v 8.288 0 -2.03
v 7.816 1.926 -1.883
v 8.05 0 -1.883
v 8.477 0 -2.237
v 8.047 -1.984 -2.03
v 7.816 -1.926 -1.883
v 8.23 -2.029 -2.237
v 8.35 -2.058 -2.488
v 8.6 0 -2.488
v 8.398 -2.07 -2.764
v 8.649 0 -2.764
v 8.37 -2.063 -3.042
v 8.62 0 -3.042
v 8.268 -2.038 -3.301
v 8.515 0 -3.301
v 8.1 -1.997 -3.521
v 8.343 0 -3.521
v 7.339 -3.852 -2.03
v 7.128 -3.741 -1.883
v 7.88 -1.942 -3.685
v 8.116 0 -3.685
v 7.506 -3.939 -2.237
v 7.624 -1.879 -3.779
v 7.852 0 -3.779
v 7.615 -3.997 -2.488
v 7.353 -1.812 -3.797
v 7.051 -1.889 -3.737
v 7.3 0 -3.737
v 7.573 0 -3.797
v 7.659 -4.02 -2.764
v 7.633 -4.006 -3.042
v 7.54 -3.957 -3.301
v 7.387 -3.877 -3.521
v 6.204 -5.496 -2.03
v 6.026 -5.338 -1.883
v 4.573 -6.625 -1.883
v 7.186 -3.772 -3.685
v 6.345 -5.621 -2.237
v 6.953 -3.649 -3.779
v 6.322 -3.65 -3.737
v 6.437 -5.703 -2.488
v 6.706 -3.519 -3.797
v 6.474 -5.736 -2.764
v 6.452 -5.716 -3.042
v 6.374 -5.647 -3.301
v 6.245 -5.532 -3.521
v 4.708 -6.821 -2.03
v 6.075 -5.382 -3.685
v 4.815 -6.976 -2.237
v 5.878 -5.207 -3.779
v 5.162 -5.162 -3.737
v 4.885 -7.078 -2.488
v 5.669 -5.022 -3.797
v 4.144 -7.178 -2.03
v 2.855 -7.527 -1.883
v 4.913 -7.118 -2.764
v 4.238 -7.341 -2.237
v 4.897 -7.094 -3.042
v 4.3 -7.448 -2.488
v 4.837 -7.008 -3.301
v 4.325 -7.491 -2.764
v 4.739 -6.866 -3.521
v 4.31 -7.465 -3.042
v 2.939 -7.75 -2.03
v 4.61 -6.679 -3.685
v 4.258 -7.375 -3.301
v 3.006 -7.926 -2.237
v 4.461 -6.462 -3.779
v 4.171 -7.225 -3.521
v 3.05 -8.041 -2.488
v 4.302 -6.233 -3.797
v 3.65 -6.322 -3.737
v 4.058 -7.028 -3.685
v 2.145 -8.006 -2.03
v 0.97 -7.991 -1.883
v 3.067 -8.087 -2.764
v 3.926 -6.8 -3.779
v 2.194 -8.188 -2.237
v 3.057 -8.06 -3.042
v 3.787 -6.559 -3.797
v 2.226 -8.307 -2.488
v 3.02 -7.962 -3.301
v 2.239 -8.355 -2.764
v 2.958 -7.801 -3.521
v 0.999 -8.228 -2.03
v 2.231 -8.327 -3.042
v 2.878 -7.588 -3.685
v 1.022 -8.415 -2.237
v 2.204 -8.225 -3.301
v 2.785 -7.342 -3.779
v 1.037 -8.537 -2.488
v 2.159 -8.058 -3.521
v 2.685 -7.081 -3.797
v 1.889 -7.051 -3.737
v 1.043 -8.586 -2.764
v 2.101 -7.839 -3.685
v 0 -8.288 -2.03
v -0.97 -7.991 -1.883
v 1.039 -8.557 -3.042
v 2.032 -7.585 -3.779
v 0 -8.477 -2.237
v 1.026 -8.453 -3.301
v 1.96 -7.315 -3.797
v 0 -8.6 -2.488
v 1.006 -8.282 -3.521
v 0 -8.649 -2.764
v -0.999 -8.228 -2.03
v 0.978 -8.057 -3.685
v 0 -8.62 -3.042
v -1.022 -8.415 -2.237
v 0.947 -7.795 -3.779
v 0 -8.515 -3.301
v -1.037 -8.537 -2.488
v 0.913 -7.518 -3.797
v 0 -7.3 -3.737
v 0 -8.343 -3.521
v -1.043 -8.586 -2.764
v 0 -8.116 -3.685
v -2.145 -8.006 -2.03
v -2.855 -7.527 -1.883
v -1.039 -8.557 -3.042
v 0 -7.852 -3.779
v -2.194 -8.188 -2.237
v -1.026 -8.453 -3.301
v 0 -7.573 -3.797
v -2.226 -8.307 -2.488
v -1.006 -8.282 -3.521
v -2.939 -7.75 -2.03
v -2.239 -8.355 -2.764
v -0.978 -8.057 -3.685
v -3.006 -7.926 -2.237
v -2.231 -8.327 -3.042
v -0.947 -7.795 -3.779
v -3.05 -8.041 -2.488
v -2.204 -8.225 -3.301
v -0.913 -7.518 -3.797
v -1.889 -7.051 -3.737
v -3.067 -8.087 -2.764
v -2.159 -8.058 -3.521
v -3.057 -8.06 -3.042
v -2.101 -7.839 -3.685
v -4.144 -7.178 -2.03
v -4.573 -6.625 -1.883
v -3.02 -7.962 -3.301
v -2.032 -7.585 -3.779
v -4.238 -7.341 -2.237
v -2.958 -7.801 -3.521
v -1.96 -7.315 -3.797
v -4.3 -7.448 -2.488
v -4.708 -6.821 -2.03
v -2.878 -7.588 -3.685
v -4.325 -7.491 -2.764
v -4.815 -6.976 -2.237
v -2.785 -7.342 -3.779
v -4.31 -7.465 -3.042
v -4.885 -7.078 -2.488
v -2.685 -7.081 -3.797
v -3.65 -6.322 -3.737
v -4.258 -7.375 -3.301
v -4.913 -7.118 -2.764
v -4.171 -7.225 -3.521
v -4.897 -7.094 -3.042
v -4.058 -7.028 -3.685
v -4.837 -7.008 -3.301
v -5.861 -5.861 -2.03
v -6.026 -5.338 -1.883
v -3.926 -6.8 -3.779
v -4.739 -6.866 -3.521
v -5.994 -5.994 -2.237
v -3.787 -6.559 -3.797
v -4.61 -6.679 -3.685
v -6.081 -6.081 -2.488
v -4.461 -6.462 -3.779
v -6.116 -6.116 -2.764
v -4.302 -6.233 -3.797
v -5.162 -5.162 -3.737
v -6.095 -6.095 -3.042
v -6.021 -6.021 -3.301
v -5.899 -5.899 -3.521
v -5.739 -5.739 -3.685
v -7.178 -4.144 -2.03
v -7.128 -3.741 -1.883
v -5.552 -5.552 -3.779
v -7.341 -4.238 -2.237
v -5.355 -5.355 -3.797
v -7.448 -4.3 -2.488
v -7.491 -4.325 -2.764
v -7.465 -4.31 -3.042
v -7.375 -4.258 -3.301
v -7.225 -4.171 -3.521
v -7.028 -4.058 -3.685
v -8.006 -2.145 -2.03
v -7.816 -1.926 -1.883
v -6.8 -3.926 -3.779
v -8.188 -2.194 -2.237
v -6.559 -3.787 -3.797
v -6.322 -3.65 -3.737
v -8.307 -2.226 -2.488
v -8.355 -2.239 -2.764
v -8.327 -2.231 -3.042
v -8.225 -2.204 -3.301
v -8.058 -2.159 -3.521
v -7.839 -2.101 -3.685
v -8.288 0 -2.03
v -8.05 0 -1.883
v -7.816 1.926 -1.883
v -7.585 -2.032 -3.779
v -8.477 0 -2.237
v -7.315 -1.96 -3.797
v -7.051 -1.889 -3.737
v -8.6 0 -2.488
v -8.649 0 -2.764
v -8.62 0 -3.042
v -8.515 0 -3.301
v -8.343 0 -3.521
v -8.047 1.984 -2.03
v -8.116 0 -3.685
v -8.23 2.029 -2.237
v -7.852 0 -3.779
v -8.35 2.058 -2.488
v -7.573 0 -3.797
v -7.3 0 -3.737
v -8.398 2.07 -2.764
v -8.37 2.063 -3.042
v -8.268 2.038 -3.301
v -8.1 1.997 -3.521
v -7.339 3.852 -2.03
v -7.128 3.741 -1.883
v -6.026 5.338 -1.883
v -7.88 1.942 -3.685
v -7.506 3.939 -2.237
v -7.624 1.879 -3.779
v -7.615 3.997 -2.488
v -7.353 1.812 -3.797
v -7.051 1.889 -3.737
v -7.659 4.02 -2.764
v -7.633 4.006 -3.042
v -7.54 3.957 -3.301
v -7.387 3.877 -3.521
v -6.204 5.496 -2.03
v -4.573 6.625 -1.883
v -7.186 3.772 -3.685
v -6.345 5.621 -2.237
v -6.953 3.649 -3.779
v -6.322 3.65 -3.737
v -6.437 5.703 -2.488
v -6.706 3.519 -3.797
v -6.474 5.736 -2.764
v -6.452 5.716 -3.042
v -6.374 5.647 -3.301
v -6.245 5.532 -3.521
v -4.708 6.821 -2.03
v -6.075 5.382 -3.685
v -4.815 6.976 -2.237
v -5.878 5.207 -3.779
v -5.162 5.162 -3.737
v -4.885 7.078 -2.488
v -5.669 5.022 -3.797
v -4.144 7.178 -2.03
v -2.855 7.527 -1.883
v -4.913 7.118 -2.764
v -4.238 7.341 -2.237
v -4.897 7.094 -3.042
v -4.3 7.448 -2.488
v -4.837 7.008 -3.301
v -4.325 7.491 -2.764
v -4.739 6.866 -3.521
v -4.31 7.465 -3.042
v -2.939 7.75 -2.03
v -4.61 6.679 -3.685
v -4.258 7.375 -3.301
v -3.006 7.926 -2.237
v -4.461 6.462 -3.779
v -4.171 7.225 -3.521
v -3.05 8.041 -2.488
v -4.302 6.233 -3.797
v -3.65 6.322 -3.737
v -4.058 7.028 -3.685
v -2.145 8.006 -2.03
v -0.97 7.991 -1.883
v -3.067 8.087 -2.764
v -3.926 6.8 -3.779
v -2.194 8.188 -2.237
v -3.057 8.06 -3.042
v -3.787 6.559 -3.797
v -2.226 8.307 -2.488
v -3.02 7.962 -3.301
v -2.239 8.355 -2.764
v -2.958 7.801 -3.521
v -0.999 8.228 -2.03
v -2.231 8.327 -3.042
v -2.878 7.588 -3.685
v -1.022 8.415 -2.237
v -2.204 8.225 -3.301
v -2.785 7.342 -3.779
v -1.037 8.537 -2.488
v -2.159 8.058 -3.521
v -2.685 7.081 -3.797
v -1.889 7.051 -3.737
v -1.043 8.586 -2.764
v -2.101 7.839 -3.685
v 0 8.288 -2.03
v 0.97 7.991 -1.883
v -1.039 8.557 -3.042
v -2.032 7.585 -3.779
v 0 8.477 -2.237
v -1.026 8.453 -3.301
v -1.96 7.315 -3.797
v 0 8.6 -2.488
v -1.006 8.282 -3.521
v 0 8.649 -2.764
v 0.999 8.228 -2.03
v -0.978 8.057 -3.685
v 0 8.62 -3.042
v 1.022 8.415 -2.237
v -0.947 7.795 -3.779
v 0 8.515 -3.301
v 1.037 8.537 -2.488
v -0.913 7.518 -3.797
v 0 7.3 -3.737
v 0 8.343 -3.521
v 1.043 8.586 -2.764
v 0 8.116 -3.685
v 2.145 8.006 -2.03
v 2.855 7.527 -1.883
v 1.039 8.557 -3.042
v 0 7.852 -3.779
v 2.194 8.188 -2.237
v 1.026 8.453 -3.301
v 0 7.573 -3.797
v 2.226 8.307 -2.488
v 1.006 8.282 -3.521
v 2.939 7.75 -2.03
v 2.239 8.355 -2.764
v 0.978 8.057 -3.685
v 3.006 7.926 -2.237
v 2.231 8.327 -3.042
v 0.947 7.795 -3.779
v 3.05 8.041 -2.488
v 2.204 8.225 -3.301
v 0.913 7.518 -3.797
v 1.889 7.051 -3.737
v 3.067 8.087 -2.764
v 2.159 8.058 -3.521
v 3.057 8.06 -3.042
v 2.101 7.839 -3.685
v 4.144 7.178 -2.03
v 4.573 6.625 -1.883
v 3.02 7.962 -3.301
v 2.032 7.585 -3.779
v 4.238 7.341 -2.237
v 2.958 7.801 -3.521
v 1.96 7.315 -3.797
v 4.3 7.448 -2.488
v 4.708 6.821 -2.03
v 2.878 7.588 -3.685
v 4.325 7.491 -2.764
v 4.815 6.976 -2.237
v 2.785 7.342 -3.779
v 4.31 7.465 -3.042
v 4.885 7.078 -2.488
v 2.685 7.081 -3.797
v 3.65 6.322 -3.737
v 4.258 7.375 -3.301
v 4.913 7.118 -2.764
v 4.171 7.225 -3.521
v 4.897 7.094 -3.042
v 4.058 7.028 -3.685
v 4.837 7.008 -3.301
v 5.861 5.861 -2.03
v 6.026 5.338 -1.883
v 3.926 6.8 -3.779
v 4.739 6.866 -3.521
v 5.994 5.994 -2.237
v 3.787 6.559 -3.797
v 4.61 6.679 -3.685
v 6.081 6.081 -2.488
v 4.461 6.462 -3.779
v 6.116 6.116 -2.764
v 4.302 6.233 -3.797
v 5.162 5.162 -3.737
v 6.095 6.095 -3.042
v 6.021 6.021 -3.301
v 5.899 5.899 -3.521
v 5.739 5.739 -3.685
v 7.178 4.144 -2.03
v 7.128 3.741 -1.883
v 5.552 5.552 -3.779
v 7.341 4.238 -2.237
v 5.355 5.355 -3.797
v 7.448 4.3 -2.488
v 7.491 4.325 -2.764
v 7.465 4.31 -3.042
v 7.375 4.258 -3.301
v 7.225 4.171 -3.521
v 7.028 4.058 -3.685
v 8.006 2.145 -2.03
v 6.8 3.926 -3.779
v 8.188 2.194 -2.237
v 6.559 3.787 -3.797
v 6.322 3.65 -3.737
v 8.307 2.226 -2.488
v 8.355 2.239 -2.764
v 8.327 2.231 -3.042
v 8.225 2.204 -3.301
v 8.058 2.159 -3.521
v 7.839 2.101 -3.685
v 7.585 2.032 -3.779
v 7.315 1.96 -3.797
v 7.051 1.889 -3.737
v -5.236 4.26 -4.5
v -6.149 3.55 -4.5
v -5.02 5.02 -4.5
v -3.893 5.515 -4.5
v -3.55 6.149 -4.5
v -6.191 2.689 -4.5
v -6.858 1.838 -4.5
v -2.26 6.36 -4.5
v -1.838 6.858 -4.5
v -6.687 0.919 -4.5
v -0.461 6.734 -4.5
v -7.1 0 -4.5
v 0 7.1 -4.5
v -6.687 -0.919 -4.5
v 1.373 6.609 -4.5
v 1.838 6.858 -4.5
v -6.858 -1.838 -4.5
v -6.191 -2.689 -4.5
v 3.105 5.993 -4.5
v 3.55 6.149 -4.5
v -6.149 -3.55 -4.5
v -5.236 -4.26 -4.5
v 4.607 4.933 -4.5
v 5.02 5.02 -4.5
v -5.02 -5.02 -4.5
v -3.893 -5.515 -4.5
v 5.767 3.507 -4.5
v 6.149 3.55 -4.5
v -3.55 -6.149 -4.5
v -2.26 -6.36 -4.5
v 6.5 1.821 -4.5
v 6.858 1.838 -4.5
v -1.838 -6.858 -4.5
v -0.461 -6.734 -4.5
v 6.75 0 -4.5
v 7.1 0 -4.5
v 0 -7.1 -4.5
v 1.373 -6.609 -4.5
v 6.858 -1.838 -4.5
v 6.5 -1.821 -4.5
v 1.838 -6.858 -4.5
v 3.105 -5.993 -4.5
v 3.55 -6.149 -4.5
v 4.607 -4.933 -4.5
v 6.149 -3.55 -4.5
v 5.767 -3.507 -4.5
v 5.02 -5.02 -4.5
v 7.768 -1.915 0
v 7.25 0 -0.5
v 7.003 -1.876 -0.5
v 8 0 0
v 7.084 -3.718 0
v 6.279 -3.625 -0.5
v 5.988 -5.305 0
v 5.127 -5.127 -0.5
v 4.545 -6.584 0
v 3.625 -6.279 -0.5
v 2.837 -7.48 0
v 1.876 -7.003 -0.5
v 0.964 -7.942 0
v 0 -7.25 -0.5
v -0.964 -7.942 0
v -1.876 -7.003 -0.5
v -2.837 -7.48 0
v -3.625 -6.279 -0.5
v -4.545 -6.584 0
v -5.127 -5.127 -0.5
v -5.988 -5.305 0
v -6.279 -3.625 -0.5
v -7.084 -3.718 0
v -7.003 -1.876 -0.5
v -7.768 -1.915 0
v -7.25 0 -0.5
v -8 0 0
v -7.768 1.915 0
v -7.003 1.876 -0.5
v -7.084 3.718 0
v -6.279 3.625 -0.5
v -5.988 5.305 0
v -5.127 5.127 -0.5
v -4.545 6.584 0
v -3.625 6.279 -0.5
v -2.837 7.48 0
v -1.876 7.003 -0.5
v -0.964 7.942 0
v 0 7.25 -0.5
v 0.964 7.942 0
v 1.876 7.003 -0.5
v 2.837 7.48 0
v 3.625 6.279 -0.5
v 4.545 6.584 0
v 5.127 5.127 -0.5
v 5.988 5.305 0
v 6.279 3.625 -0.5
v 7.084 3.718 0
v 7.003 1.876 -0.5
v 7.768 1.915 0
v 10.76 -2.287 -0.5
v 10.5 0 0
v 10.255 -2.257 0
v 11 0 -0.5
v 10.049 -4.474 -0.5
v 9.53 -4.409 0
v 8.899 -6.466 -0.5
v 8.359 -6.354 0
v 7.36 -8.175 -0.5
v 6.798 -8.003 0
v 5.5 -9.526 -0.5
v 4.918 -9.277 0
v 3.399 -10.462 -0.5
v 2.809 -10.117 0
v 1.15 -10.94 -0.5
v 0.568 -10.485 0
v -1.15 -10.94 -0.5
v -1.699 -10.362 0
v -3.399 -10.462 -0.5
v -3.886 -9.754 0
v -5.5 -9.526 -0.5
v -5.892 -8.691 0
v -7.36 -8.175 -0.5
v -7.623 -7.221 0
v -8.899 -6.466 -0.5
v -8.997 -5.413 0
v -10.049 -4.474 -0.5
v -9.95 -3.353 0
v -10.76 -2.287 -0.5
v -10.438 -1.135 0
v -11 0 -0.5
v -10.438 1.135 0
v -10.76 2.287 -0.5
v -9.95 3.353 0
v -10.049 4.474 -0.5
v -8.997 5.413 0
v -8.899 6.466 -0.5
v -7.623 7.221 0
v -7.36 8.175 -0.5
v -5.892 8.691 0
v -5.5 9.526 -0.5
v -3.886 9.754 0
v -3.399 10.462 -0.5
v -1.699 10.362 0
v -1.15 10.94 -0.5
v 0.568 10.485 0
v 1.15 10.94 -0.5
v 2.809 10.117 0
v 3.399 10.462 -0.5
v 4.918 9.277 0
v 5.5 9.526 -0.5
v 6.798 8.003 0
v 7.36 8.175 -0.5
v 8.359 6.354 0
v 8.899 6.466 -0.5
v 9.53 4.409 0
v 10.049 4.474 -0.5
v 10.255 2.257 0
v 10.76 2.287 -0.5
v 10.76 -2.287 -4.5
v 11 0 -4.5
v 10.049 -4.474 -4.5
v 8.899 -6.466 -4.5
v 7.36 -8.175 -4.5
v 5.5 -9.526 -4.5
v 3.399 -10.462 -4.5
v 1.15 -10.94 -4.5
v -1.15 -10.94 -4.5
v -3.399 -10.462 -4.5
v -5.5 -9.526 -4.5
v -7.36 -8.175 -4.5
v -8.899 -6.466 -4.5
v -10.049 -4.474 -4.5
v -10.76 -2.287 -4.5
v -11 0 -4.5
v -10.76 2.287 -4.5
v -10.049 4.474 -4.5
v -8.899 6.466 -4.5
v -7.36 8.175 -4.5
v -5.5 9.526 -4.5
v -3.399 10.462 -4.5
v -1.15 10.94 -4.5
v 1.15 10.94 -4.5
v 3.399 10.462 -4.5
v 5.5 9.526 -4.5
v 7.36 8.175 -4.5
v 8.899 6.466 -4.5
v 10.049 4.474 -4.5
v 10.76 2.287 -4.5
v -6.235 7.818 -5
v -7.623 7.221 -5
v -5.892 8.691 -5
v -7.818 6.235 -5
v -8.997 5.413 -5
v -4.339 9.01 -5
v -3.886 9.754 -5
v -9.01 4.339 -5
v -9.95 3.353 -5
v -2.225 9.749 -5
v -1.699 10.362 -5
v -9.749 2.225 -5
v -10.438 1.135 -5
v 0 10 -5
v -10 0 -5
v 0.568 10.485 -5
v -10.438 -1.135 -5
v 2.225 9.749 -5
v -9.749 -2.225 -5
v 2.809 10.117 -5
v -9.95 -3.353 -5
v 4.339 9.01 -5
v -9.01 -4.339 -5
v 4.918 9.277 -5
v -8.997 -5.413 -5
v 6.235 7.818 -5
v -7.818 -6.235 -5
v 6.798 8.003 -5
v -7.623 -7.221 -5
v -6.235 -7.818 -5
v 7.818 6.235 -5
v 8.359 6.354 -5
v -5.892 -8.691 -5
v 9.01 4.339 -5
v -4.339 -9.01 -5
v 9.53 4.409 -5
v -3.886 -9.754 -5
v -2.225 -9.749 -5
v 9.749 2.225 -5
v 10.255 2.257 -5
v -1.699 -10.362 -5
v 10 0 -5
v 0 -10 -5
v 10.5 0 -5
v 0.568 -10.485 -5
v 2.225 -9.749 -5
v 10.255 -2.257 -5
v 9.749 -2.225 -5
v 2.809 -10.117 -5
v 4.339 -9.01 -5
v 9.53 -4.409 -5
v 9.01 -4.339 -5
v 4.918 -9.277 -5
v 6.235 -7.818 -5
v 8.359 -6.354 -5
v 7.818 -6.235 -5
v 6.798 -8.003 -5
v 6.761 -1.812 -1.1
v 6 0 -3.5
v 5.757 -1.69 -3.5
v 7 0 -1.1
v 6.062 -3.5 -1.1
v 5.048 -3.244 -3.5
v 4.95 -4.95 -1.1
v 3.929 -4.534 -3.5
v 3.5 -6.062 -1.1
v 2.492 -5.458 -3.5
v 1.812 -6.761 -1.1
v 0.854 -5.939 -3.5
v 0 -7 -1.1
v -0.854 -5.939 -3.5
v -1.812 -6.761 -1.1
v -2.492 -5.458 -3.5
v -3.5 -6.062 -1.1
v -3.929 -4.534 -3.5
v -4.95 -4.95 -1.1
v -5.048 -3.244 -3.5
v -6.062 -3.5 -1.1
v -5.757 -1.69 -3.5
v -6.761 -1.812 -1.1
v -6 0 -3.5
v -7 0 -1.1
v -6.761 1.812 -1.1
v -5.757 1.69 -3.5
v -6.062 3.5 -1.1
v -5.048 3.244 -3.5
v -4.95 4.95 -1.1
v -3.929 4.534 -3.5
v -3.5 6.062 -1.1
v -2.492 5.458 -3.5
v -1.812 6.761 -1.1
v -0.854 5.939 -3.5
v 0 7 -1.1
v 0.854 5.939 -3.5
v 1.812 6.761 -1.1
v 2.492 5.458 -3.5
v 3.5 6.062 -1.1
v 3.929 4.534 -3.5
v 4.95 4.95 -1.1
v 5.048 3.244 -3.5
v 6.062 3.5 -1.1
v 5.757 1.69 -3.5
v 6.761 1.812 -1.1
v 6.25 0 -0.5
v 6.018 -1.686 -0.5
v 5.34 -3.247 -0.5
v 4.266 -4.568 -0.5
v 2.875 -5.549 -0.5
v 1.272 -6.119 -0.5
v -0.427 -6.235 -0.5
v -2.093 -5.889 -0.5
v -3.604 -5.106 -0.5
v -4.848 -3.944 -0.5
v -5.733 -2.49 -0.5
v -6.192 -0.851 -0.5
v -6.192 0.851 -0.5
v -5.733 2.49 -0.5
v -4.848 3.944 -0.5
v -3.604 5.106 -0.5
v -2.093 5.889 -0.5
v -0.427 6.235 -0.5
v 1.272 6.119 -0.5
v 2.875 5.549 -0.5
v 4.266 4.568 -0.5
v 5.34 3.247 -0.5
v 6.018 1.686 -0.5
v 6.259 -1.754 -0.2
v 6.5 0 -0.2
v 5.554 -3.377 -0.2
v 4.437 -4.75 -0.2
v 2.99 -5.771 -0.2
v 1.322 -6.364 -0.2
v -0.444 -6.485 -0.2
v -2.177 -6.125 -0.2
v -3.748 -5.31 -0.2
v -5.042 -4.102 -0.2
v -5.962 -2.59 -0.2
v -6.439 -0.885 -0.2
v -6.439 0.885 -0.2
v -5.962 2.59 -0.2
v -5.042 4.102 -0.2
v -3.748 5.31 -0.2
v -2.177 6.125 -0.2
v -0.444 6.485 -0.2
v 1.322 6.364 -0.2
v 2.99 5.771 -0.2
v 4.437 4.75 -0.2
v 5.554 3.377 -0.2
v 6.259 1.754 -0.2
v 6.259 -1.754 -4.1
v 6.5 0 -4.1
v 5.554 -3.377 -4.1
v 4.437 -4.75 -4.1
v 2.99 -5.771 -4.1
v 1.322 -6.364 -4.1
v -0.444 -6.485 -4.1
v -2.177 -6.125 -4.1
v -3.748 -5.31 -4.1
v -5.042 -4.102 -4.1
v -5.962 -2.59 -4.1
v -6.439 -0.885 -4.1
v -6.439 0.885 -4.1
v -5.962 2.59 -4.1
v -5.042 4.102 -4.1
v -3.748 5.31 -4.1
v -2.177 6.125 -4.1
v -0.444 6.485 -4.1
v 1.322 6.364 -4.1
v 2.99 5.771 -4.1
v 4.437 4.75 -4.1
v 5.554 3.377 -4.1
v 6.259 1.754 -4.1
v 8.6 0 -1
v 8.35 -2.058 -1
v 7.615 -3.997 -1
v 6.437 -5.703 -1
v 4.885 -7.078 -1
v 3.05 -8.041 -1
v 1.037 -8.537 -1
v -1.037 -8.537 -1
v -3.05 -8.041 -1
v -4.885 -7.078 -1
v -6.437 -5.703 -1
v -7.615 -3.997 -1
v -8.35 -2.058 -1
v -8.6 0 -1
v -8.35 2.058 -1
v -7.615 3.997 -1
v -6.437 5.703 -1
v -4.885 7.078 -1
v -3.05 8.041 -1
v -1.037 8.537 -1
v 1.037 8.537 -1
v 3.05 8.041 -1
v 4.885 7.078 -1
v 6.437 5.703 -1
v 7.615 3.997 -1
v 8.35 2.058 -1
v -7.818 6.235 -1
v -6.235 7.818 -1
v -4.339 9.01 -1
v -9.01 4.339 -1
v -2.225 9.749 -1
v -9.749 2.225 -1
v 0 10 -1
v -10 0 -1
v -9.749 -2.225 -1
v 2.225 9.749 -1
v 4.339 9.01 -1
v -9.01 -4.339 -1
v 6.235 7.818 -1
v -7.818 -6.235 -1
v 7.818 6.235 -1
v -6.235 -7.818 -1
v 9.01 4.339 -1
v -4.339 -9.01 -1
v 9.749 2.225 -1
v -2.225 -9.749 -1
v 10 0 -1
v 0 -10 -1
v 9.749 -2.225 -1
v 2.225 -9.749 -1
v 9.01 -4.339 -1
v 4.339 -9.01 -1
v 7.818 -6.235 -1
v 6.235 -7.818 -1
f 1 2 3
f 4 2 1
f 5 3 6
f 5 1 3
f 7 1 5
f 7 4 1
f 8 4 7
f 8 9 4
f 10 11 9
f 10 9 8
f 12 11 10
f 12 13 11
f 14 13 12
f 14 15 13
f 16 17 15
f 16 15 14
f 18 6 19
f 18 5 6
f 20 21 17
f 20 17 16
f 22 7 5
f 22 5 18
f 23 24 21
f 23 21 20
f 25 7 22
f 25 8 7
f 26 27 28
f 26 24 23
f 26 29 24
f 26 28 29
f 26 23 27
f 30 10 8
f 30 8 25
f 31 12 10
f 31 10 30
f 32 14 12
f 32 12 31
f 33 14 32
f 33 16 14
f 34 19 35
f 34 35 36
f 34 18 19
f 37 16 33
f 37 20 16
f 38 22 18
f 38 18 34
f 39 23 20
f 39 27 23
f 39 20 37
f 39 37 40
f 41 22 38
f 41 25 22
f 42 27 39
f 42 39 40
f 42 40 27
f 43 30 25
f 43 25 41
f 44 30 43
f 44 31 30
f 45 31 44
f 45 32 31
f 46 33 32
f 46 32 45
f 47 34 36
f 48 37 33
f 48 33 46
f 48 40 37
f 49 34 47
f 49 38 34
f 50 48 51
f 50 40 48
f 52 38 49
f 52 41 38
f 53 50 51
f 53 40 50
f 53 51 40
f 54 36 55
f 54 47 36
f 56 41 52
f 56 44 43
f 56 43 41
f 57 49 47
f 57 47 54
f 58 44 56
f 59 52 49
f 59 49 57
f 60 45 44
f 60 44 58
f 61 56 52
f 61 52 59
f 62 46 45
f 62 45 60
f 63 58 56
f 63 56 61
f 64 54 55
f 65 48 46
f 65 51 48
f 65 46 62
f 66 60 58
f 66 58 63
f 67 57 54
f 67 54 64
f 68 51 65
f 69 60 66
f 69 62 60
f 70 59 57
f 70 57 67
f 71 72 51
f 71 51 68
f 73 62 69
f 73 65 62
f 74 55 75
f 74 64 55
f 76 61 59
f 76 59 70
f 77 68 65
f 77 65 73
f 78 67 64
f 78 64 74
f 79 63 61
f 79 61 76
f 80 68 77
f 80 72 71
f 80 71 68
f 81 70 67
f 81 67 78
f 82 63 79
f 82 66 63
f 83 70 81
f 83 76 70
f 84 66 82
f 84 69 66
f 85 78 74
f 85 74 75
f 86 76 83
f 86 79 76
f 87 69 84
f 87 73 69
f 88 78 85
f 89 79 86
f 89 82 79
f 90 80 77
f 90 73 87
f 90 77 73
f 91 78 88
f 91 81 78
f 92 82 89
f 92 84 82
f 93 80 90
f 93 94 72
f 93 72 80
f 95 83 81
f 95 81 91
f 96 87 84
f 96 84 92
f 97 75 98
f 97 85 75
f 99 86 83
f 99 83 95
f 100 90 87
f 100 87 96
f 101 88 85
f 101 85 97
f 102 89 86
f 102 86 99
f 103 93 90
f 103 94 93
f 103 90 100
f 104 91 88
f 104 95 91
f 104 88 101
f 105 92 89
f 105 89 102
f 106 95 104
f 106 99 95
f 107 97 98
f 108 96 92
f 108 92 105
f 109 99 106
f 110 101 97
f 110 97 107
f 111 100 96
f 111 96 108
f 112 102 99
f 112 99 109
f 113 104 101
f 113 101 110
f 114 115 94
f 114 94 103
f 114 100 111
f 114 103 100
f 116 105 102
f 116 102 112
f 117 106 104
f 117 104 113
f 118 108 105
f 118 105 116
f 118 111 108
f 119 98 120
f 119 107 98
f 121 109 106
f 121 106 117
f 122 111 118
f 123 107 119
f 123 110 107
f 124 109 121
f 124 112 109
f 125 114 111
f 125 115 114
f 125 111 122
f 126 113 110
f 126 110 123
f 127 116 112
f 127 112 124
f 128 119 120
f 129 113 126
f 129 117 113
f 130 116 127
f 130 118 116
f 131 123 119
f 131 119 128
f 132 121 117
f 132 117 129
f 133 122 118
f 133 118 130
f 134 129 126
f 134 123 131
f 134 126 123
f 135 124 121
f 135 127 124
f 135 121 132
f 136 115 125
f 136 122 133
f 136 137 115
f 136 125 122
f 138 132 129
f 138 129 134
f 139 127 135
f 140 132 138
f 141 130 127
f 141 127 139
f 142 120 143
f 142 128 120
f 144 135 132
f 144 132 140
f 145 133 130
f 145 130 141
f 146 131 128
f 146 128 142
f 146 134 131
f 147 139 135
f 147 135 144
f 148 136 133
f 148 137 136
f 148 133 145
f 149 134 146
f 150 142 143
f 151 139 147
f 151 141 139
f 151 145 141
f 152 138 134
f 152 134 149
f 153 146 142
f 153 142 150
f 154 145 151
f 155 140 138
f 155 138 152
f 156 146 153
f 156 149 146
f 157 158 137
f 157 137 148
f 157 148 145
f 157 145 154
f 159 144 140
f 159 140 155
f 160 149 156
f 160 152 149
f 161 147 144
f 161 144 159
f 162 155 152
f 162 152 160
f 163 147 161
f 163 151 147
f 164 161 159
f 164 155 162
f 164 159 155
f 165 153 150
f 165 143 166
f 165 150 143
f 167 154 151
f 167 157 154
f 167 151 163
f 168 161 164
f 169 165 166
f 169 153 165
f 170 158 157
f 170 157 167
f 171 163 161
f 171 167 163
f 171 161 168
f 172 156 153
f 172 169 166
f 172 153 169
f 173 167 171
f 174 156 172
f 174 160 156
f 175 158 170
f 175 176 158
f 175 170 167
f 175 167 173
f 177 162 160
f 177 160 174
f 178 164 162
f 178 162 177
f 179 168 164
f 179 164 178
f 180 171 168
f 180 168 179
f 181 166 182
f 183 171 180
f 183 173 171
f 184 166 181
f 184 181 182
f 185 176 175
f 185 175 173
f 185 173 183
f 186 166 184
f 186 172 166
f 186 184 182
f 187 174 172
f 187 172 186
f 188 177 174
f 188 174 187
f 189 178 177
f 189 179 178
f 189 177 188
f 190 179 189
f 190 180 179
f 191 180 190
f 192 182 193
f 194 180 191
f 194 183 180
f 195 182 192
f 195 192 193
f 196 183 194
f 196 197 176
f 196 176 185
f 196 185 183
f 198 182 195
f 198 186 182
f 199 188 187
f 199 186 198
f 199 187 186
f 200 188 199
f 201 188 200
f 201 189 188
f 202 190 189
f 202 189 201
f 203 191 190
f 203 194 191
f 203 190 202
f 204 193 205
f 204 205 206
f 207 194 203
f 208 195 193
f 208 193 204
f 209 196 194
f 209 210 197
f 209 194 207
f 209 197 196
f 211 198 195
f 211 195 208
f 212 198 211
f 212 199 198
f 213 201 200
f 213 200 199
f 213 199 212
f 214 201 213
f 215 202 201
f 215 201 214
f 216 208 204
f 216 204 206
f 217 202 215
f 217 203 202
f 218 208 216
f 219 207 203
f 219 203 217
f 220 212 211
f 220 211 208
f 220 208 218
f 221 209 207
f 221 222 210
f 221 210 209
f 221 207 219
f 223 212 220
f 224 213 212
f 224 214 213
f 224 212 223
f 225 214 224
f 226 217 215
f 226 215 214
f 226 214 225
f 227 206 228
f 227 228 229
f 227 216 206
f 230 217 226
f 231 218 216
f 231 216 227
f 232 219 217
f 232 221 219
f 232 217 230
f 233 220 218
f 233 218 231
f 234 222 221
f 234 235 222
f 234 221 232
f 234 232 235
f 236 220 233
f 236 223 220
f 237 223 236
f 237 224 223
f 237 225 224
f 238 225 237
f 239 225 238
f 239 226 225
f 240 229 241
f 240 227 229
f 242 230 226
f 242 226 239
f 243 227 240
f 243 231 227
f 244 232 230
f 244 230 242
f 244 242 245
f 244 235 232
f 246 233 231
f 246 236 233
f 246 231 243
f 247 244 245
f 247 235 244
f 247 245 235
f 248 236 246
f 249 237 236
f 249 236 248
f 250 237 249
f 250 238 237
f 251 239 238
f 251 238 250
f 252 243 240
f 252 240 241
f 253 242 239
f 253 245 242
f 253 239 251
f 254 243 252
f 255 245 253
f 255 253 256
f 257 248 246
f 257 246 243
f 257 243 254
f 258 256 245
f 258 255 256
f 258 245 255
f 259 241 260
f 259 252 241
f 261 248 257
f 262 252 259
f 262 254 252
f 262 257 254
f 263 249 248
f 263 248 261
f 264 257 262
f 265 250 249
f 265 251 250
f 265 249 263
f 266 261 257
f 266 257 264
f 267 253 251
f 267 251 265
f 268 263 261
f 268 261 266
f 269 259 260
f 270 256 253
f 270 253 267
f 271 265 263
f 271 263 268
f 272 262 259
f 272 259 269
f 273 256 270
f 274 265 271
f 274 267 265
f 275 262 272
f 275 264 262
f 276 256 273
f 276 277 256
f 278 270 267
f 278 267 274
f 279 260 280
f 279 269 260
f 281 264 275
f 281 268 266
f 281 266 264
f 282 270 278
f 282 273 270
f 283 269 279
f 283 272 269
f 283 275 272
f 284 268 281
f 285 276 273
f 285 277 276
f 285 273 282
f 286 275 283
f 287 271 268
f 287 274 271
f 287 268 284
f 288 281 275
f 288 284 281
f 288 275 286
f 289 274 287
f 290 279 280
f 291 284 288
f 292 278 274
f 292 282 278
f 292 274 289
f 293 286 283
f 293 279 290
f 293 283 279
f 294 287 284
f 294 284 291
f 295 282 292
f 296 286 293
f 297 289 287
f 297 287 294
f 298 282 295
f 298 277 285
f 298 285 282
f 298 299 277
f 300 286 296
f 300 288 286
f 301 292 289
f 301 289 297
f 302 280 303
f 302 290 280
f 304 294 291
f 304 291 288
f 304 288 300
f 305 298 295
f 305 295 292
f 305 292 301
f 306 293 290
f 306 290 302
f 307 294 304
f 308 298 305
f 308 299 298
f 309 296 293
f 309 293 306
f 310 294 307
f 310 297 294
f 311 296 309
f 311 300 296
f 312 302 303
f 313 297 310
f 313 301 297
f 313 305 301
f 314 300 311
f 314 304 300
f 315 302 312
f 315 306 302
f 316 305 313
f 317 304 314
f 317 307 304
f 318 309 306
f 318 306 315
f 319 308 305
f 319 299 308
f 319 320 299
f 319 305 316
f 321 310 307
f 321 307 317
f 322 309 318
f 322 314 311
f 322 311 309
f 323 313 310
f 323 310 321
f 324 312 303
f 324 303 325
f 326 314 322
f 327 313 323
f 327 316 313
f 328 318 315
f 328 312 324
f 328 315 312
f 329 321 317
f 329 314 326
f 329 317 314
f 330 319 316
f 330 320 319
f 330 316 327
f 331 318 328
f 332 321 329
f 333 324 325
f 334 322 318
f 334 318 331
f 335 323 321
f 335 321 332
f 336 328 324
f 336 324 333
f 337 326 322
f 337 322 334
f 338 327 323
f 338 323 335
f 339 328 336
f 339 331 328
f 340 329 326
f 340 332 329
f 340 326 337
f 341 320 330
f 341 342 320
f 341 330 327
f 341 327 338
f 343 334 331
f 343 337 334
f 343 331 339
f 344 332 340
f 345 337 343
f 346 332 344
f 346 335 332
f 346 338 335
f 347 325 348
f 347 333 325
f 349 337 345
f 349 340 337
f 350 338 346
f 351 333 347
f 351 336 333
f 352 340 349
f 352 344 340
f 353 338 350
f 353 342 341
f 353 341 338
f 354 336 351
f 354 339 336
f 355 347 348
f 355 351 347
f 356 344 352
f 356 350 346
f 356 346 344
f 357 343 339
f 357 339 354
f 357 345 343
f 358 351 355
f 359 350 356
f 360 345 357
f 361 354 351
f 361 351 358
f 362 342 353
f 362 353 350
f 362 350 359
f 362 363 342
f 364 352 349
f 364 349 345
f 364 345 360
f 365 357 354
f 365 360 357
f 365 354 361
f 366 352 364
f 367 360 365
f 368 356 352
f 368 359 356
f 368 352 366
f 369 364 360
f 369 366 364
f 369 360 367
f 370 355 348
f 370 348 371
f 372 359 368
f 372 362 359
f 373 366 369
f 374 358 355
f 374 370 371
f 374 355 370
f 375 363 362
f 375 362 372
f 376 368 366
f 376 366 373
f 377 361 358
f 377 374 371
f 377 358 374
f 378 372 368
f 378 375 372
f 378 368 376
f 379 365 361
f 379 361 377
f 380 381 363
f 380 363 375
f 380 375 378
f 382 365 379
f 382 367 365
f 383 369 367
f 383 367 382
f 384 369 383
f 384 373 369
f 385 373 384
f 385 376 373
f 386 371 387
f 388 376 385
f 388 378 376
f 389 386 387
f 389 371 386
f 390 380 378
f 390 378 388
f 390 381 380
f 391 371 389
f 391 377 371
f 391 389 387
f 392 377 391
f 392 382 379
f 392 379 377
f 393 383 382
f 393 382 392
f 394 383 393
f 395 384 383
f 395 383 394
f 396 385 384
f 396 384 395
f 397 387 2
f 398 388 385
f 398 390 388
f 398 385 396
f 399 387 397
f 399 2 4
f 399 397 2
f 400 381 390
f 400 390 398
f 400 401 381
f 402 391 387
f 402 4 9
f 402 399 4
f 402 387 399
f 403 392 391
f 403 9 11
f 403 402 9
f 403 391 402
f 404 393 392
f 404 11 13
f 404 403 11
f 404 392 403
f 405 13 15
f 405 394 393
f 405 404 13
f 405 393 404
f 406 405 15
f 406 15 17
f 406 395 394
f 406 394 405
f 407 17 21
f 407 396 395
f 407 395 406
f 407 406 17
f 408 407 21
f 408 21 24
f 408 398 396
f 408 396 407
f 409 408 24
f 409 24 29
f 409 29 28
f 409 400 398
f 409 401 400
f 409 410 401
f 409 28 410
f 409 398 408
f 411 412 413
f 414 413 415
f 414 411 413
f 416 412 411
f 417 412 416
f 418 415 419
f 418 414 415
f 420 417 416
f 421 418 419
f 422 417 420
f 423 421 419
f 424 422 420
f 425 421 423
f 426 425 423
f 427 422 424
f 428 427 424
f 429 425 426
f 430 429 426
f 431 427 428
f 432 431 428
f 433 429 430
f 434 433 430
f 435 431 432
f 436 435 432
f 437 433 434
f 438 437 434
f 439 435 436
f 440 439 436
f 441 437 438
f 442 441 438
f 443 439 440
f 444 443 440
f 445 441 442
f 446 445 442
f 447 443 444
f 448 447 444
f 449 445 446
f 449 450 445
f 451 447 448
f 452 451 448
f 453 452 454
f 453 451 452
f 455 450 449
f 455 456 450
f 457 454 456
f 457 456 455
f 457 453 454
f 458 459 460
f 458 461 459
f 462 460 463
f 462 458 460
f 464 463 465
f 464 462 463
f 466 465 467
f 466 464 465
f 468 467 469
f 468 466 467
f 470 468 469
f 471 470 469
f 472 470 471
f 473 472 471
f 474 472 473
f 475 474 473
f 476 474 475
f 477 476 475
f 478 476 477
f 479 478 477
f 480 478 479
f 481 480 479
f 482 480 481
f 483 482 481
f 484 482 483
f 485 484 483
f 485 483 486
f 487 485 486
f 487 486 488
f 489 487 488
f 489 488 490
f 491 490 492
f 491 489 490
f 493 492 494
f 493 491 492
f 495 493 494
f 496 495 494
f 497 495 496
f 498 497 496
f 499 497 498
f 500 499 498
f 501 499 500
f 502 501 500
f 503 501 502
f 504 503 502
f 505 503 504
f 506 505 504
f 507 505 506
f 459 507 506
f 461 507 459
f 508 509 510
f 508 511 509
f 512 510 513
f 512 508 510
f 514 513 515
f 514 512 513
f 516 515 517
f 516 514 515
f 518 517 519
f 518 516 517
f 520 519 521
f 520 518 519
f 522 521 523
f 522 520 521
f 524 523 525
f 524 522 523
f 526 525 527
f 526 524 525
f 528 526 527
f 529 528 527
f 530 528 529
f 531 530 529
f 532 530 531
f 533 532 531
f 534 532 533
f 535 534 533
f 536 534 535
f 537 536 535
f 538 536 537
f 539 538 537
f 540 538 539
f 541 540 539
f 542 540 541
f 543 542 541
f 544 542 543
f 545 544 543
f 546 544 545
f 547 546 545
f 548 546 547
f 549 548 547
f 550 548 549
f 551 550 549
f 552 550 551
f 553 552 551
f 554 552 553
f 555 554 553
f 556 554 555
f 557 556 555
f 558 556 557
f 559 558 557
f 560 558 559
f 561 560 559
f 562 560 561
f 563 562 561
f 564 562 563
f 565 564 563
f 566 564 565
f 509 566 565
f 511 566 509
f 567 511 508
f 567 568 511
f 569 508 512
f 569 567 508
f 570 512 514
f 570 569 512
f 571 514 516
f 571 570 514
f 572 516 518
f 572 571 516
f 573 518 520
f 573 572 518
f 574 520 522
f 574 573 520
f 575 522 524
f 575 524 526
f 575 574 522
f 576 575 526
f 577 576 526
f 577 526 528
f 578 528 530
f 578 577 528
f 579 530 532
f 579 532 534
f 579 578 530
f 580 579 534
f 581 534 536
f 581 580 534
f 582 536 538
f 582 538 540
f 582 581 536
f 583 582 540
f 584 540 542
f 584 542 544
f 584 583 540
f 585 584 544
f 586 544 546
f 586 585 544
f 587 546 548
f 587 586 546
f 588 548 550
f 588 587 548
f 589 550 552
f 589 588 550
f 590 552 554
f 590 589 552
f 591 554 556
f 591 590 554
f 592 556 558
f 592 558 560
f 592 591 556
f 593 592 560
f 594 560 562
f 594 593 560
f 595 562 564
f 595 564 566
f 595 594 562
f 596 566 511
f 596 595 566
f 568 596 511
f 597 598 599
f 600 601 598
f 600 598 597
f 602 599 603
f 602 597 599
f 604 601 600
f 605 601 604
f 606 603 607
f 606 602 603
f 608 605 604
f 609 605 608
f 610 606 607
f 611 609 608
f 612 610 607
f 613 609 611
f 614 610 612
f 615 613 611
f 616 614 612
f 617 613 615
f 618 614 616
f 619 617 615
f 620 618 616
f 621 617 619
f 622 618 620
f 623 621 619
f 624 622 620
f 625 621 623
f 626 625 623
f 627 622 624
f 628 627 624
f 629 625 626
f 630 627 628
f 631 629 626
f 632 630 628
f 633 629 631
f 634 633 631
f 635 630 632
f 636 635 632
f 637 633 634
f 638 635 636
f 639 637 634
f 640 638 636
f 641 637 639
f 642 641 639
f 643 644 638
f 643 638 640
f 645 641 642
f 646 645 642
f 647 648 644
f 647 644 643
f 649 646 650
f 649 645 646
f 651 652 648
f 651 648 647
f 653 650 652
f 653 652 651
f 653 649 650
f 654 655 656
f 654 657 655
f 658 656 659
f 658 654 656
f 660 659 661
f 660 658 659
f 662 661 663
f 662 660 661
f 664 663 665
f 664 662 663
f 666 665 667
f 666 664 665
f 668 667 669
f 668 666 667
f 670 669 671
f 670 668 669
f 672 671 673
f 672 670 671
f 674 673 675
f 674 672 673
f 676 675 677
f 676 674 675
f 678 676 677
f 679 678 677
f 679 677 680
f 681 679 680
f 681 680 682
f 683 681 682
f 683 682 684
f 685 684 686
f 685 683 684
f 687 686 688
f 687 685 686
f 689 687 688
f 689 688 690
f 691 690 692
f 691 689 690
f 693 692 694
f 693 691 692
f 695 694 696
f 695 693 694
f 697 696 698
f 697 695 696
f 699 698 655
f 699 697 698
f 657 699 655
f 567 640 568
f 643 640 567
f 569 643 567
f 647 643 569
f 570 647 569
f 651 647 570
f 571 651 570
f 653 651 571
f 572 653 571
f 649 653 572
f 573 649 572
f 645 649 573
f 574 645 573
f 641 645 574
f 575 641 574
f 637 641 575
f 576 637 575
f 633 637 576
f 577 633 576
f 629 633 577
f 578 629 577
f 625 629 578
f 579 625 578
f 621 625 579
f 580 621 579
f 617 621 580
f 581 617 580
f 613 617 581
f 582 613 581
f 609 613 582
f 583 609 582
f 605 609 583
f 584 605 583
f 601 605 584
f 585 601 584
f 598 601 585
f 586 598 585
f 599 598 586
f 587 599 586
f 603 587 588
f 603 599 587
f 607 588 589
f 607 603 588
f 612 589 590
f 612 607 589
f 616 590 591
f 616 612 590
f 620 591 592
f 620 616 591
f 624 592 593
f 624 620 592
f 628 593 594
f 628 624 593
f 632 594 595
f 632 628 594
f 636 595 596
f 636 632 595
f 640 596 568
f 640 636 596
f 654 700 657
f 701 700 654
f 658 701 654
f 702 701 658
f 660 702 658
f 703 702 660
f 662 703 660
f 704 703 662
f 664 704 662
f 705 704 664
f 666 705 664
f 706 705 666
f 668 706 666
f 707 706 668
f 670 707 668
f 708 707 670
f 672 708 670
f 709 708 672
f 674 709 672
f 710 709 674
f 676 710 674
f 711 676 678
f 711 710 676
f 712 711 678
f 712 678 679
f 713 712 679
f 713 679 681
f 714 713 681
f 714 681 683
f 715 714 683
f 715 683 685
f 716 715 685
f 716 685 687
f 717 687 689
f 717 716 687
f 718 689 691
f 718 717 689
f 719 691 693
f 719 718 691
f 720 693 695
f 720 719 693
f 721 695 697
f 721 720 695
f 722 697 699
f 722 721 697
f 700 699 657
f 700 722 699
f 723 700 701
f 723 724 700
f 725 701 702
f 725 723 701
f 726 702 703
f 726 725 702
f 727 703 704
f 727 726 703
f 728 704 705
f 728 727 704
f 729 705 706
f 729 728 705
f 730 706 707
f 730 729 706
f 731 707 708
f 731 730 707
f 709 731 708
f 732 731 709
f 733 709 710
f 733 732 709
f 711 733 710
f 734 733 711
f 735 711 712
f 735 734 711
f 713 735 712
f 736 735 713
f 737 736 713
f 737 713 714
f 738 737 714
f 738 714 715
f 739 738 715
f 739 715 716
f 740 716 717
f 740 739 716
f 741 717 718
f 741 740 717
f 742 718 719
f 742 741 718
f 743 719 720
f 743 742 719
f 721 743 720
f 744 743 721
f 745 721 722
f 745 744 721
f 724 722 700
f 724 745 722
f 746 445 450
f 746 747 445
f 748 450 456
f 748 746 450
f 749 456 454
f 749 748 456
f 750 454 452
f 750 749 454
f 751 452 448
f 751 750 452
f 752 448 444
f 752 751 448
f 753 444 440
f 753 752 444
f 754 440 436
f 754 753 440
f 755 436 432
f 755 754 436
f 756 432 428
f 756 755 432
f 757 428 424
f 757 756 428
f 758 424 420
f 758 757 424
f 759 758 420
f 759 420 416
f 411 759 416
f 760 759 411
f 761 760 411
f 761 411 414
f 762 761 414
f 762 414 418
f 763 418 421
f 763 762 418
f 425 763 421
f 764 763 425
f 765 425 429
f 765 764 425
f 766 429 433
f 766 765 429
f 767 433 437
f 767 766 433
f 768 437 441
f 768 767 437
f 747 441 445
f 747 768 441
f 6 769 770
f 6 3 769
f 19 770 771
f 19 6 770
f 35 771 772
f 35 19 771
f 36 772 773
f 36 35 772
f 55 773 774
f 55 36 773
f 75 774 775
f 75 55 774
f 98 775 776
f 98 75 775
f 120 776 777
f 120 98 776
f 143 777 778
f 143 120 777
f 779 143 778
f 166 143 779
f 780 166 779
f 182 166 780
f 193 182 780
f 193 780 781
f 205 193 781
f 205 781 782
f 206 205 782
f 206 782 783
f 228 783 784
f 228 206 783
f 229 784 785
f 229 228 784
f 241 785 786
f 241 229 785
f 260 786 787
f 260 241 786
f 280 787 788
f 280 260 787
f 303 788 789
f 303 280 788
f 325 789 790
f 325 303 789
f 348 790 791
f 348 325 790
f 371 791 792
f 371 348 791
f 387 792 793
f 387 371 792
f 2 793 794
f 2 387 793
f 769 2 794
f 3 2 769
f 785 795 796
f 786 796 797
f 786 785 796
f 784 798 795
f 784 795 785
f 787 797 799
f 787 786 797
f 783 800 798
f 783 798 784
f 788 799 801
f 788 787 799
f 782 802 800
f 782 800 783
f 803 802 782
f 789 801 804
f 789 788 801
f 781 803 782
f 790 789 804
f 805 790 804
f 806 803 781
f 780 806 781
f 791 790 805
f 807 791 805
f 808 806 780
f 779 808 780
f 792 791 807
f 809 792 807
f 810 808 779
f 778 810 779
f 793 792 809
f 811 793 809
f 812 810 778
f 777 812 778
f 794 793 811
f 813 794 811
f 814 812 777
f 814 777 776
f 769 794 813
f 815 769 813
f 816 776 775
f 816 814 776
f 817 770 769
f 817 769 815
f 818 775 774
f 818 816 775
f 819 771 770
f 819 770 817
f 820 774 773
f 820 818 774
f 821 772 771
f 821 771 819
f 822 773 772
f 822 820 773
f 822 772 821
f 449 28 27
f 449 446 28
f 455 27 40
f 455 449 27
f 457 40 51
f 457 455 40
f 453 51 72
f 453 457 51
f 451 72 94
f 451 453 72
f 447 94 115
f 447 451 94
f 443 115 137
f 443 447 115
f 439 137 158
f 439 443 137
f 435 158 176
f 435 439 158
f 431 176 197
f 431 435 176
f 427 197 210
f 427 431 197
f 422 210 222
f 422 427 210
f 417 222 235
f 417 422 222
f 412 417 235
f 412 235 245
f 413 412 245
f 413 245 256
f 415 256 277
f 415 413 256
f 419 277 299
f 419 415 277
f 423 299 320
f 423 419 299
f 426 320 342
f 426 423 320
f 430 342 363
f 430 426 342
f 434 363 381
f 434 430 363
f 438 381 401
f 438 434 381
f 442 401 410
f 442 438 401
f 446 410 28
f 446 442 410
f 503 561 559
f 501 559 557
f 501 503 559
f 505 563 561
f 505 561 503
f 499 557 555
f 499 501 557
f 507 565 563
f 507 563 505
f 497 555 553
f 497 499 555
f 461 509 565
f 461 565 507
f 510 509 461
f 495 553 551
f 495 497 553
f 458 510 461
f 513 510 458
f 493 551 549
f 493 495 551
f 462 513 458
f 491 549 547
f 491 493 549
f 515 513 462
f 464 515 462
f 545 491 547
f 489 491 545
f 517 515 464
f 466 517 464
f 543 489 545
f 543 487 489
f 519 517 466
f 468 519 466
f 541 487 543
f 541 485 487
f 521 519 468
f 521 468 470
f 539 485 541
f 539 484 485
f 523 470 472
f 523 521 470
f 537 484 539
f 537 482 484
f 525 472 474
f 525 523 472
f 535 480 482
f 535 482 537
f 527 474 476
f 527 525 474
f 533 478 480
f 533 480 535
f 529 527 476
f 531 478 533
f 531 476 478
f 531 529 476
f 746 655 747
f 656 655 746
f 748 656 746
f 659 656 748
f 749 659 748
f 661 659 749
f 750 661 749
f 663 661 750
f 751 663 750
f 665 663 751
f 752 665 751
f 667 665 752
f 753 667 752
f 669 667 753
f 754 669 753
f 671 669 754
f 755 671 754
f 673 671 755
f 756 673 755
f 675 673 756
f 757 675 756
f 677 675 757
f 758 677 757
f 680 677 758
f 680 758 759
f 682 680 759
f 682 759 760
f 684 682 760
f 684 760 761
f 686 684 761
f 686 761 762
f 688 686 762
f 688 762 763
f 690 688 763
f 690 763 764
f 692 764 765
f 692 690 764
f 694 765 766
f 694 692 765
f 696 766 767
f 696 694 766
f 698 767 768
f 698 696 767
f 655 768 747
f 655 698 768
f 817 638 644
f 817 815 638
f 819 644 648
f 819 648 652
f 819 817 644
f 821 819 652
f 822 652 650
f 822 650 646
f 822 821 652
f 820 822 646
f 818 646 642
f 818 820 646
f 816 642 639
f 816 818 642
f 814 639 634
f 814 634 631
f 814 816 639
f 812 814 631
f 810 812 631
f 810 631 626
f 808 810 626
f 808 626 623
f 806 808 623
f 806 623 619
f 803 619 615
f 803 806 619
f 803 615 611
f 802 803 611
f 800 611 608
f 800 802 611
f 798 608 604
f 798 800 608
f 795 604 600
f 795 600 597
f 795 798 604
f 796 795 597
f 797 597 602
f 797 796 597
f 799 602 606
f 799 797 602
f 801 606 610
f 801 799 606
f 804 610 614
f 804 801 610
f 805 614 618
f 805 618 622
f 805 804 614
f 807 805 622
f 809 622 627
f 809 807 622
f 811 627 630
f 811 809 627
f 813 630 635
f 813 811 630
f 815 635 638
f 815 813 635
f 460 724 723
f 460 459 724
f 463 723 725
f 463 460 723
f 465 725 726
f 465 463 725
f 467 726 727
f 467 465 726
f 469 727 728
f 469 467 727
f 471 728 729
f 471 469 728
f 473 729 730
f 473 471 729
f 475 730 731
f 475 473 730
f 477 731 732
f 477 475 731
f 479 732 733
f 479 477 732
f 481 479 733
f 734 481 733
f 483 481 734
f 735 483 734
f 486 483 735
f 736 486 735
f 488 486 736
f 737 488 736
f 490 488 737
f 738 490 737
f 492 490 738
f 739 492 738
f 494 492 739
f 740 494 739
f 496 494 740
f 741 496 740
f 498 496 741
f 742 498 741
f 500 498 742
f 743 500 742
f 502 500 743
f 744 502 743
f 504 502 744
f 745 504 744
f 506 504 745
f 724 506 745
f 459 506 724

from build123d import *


with BuildPart() as part:
    # Esquisse1 → Révolution1 (revolve)
    with BuildSketch(Plane(origin=(0, 0, 0), x_dir=(0, 0, -1), z_dir=(1, 0, 0)), mode=Mode.PRIVATE) as r_volution1_sk:
        with BuildLine():
            Line((3.7367497, 7.3), (4.5, 7.1))
            Line((4.5, 7.1), (4.5, 6.75))
            Line((4.5, 6.75), (4.1, 6.5))
            Line((4.1, 6.5), (3.5, 6))
            Line((3.5, 6), (1.1, 7))
            Line((1.1, 7), (0.5, 6.25))
            Line((0.5, 6.25), (0.2, 6.5))
            Line((0.2, 6.5), (0.5, 7.25))
            Line((0.5, 7.25), (0, 8))
            Line((0, 8), (0, 10.5))
            Line((0, 10.5), (0.5, 11))
            Line((0.5, 11), (4.5, 11))
            Line((4.5, 11), (5, 10.5))
            Line((5, 10.5), (5, 10))
            Line((5, 10), (1, 10))
            Line((1, 10), (1, 8.6))
            Line((1, 8.6), (1.883484861, 8.05))
            ThreePointArc((1.883484861, 8.05), (3.175136454, 8.576969601), (3.7367497, 7.3))
        make_face()
    revolve(r_volution1_sk.sketch.rotate(Axis((0, 0, 0), (0, 0, -1)), 90), axis=Axis((0, 0, 0), (0, 0, -1)))


solid = part.part
